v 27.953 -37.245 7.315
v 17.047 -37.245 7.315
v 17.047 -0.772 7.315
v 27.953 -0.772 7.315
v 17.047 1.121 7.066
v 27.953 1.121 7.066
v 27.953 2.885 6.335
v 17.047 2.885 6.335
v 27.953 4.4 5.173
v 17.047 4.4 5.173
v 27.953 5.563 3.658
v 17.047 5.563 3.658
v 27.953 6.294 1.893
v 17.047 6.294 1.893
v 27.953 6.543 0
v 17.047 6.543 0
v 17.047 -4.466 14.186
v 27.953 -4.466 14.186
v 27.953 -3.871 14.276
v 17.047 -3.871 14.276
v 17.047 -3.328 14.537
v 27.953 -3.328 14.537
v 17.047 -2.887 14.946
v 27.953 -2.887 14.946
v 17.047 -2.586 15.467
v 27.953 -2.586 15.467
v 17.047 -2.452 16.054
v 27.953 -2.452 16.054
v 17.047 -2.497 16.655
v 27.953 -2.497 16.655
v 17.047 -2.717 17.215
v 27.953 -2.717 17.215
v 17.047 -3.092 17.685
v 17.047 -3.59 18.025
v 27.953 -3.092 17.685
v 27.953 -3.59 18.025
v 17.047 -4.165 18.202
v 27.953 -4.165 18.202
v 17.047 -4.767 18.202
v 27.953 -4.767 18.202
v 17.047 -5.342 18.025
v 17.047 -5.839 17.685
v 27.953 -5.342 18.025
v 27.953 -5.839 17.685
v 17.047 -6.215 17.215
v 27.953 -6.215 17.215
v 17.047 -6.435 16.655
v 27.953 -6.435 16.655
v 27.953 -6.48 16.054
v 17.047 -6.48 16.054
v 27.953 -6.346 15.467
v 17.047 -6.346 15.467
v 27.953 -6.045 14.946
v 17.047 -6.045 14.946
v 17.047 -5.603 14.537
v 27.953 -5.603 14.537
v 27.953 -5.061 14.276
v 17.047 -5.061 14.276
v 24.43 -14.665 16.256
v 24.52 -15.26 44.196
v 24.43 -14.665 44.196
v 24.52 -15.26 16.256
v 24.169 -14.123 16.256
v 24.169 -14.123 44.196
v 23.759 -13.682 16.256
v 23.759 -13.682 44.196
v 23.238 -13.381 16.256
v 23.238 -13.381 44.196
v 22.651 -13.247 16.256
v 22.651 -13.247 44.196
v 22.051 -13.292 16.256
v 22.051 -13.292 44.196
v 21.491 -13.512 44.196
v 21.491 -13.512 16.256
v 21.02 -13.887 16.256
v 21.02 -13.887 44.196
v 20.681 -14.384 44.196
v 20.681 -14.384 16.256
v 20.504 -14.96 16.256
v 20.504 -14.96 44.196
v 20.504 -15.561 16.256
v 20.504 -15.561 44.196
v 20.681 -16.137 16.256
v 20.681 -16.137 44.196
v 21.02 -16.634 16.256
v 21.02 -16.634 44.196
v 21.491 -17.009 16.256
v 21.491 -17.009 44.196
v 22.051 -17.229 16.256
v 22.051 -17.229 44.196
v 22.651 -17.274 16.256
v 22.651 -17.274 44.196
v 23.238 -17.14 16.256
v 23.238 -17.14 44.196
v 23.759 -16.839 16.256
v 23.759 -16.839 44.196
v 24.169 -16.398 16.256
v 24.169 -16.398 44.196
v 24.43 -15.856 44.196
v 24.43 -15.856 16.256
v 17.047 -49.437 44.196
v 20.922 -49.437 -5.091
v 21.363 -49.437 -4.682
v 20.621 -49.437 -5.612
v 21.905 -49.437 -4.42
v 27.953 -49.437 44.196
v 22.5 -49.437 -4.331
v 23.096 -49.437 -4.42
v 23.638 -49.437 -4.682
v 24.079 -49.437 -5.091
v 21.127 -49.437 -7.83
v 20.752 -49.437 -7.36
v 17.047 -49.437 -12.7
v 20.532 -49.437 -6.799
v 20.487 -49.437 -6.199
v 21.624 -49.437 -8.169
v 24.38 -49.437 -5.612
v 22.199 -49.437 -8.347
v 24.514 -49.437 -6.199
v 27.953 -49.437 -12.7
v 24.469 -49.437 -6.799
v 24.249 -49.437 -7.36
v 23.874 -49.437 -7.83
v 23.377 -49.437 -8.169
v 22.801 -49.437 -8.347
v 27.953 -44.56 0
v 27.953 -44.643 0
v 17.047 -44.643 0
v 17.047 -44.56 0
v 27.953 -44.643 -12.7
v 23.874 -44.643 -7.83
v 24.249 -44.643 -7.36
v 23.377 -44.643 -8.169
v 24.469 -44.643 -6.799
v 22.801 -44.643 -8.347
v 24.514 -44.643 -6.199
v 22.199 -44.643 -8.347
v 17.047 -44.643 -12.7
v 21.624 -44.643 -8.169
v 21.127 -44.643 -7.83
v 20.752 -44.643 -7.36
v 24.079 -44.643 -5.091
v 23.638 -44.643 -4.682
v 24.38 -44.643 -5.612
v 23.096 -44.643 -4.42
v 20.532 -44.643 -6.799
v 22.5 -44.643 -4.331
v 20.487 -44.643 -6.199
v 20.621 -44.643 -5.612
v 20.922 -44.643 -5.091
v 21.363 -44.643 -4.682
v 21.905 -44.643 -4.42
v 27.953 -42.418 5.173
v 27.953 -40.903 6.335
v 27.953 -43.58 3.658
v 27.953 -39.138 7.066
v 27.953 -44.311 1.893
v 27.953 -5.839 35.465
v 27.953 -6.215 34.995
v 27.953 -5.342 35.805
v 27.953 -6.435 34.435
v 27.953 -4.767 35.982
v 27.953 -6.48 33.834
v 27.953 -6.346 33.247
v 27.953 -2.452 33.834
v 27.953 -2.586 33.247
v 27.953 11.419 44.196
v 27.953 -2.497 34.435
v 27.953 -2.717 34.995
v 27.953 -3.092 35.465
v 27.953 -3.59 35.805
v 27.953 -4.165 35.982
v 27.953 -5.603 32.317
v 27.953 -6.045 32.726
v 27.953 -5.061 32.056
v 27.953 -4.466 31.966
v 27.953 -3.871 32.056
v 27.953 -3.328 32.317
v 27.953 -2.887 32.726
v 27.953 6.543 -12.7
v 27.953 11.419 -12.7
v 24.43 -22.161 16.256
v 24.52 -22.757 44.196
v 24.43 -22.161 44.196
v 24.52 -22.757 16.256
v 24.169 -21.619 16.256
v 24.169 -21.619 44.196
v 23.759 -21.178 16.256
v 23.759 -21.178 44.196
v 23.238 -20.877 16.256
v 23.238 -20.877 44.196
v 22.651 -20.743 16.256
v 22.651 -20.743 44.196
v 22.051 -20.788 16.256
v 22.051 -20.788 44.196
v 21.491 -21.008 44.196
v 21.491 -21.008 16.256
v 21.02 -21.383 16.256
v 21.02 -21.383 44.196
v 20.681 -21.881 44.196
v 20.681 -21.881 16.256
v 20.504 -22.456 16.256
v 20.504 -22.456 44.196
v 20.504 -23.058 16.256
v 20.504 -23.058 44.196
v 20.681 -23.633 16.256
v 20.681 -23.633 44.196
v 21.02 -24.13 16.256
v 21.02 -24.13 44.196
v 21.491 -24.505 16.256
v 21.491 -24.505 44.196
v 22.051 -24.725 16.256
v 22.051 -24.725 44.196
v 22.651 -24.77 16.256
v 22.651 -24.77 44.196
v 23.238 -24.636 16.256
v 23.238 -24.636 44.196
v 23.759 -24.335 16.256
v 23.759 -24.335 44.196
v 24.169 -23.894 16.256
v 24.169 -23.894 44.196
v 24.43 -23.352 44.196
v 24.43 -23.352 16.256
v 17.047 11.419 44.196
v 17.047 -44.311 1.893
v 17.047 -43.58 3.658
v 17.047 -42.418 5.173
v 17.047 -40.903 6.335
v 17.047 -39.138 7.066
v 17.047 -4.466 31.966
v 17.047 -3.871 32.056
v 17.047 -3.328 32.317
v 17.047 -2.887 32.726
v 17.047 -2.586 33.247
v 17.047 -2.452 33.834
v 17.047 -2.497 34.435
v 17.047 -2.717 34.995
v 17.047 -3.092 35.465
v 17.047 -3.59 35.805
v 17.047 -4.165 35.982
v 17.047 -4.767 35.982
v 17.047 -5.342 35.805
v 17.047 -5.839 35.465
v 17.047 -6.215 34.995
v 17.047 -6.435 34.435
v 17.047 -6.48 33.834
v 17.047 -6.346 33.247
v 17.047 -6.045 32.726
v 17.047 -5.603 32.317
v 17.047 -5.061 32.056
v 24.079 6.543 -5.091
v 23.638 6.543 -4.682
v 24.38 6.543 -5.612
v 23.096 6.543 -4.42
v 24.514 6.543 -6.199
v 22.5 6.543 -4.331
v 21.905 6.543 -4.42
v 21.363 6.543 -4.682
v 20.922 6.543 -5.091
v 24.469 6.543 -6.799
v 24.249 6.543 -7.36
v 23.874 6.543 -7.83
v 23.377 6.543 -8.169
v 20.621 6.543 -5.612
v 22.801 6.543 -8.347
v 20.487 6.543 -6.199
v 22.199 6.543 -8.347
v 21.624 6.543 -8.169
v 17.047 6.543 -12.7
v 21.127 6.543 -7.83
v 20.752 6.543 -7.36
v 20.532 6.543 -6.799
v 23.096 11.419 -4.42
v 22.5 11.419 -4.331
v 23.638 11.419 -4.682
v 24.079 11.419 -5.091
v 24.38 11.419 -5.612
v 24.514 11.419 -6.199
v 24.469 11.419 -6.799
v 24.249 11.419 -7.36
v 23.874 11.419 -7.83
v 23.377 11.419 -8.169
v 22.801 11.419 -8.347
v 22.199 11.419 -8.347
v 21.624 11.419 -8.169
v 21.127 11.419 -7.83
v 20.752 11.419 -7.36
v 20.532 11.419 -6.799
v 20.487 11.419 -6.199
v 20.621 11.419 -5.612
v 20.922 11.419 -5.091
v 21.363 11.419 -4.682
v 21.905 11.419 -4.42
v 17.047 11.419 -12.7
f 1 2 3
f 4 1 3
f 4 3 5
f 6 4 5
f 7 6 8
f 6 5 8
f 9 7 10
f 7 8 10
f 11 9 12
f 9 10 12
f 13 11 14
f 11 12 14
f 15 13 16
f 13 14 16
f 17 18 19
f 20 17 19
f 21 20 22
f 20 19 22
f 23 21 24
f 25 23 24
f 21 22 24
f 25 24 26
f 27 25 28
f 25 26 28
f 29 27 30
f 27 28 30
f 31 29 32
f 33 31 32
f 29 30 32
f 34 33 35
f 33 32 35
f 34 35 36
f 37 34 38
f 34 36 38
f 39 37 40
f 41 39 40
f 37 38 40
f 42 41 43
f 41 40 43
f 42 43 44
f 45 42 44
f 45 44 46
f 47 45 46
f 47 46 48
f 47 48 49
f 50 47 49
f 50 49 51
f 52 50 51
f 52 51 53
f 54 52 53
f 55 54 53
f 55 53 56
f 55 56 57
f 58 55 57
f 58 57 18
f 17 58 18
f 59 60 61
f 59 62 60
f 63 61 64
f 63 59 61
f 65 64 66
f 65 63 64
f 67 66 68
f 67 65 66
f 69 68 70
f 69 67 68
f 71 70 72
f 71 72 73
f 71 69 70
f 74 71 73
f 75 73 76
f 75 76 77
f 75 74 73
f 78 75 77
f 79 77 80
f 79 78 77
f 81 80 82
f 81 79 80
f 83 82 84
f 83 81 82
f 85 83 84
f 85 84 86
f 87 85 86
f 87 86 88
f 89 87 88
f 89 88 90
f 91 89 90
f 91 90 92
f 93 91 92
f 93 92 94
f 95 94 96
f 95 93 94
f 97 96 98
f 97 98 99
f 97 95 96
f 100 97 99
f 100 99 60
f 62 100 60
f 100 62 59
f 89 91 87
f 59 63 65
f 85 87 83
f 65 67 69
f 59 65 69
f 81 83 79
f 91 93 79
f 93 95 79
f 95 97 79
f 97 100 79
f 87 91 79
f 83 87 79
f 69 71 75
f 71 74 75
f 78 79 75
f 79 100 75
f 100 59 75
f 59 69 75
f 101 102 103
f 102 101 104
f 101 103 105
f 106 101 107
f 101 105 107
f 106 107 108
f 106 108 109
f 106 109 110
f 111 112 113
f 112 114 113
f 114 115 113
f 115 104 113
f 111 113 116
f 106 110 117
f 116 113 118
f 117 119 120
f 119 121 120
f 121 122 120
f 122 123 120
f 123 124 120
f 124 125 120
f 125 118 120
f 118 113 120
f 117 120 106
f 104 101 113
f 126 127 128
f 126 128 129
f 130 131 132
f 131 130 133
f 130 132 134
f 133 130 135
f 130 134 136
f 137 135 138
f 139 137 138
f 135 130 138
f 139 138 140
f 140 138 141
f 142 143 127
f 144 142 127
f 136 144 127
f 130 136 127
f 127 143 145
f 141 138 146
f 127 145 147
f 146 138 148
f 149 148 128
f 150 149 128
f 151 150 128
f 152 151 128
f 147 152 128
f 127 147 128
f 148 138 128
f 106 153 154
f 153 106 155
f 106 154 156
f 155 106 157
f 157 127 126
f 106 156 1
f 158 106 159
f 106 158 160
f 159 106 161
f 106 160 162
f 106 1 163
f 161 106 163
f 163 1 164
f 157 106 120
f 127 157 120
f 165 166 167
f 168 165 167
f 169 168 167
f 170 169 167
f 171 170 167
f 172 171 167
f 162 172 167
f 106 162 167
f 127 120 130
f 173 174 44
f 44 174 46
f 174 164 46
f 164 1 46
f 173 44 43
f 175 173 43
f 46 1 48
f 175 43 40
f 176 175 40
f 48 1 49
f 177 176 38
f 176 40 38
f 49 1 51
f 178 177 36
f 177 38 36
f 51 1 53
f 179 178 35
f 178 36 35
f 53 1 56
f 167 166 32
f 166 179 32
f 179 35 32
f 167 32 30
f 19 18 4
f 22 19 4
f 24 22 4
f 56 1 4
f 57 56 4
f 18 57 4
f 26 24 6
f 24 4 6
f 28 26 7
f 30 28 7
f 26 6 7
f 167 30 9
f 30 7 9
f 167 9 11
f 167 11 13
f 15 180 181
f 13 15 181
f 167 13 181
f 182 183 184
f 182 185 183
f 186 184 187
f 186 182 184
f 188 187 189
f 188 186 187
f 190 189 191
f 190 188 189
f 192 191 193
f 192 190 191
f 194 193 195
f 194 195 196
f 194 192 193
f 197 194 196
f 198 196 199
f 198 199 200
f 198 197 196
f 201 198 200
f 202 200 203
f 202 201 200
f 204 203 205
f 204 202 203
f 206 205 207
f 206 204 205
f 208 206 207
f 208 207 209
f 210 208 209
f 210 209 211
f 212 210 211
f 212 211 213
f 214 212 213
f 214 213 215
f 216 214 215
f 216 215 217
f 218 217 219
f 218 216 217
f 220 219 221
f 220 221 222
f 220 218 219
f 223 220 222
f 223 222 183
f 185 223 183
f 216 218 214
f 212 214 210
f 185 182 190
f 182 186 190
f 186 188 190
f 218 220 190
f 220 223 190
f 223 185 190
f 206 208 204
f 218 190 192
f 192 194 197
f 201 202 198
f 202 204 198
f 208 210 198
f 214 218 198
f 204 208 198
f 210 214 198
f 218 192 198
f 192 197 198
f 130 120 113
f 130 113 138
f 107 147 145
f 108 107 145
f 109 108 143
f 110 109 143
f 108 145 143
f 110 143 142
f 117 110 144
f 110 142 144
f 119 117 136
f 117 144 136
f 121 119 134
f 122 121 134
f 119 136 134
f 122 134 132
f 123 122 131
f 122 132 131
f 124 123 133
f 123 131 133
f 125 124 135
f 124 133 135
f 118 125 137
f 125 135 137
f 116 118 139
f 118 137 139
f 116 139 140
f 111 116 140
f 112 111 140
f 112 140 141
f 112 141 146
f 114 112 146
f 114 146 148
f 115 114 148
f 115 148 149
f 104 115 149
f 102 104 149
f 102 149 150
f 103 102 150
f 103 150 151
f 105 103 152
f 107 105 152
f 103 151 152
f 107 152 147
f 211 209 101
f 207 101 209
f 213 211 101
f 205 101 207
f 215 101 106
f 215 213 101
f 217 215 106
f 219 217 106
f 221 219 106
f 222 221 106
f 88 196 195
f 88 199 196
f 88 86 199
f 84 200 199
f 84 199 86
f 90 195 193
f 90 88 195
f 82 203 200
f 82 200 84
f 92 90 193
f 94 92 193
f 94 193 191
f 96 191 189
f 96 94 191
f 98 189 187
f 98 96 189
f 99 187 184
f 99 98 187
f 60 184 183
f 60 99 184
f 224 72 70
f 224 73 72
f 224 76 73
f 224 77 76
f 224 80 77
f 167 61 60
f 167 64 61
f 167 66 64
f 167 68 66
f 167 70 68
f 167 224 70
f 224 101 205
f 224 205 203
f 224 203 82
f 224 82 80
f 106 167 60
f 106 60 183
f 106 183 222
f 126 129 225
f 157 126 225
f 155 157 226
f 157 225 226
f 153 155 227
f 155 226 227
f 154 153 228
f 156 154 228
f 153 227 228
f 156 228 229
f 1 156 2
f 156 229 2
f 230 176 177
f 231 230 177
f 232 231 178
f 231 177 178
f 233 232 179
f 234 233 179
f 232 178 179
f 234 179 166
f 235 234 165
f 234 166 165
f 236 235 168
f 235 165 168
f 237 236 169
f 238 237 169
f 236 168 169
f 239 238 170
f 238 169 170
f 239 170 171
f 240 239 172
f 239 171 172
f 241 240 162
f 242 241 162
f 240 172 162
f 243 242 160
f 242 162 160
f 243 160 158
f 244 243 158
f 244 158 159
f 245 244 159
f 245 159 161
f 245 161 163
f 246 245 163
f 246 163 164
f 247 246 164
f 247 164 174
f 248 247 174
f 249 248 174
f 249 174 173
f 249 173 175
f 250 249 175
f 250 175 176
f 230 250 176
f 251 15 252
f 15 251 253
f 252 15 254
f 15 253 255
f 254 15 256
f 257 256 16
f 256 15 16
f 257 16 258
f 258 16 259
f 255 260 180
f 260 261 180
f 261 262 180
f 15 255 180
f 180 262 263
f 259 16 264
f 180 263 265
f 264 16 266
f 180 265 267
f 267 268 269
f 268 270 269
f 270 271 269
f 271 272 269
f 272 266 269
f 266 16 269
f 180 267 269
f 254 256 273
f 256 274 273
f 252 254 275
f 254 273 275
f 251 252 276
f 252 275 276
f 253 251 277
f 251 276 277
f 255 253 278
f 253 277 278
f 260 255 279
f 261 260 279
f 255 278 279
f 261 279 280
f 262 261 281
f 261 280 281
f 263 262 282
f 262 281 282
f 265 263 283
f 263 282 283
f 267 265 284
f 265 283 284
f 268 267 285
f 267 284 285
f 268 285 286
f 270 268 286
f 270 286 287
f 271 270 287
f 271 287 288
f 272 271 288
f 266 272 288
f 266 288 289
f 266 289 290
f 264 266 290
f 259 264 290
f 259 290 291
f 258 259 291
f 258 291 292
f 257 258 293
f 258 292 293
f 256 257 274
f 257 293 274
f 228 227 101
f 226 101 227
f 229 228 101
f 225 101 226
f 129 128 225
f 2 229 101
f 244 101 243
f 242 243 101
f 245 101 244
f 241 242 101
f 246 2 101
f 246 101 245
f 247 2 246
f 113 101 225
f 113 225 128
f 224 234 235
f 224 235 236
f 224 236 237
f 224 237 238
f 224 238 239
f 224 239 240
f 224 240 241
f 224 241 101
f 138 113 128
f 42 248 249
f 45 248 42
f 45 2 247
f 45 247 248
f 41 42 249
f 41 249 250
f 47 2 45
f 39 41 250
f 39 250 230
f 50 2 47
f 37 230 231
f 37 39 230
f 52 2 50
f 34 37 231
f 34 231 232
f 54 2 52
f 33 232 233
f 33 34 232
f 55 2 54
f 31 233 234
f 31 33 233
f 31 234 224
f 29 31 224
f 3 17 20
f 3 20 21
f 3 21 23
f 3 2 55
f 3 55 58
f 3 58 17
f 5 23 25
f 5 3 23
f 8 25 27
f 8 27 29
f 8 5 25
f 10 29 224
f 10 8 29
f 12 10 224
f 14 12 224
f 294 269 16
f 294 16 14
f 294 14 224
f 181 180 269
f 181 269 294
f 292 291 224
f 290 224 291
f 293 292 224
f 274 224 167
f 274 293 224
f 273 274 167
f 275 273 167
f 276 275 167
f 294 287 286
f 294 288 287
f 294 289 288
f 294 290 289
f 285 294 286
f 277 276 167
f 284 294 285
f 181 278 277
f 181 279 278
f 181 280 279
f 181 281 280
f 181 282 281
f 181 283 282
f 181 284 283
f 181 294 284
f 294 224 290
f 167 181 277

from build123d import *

# Parameters (mm, degrees)
SKETCH1_W           = 41.656
SKETCH1_H           = 60.855895471
BOSS_EXTRUDE1_DEPTH = 10.905899582
CUT_EXTRUDE1_DEPTH  = 59.321153171
SKETCH5_W           = 2.0193
SKETCH5_H           = 60.855895471
SKETCH6_W           = 2.0193
SKETCH6_H           = 12.7
SKETCH7_W           = 2.0193
SKETCH7_H           = 12.7
SKETCH8_W           = 10.905899582
SKETCH8_H           = 60.855895471
SKETCH8_R           = 2.0193
BOSS_EXTRUDE2_DEPTH = 15.24
SKETCH9_R           = 2.0193
CUT_EXTRUDE2_DEPTH  = 68.202629317


with BuildPart() as part:
    # Sketch1 → Boss-Extrude1 (new body)
    with BuildSketch(Plane(origin=(27.95338, 0, 0), x_dir=(0, 0, -1), z_dir=(1, 0, 0))):
        with Locations((-8.128, -19.008560287)):
            Rectangle(SKETCH1_W, SKETCH1_H)
    extrude(amount=-BOSS_EXTRUDE1_DEPTH)

    # Sketch2 → Cut-Extrude1 (cut, through all)
    with BuildSketch(Plane.ZY.offset(-17.047480418)):
        with BuildLine():
            Line((-12.7, 6.54304), (-12.7, -44.64304))
            Line((-12.7, -44.64304), (0, -44.64304))
            Line((0, -44.64304), (0, -44.560160575))
            ThreePointArc((0, -44.560160575), (5.172627526, -42.4175881), (7.3152, -37.244960575))
            Line((7.3152, -37.244960575), (7.3152, -0.77216))
            ThreePointArc((7.3152, -0.77216), (5.172627526, 4.400467526), (0, 6.54304))
            Line((0, 6.54304), (-12.7, 6.54304))
        make_face()
    extrude(amount=-CUT_EXTRUDE1_DEPTH, mode=Mode.SUBTRACT)

    # Sketch5 → Cut-Revolve3 (revolve, cut)
    with BuildSketch(Plane(origin=(0, 0, -6.35), x_dir=(-1, 0, 0), z_dir=(0, 0, -1)), mode=Mode.PRIVATE) as cut_revolve3_sk:
        with Locations((-23.510080209, -19.008560287)):
            Rectangle(SKETCH5_W, SKETCH5_H)
    revolve(cut_revolve3_sk.sketch.rotate(Axis((22.500430209, -49.436508023, -6.35), (0, 1, 0)), 270), axis=Axis((22.500430209, -49.436508023, -6.35), (0, 1, 0)), mode=Mode.SUBTRACT)

    # Sketch6 → Cut-Revolve4 (revolve, cut)
    with BuildSketch(Plane(origin=(0, -22.756653096, 0), x_dir=(1, 0, 0), z_dir=(0, 1, 0))):
        with Locations((23.510080209, -22.606)):
            Rectangle(SKETCH6_W, SKETCH6_H)
    revolve(axis=Axis((22.500430209, -22.756653096, 16.256), (0, 0, 1)), mode=Mode.SUBTRACT)

    # Sketch7 → Cut-Revolve5 (revolve, cut)
    with BuildSketch(Plane(origin=(0, -15.260467479, 0), x_dir=(1, 0, 0), z_dir=(0, 1, 0))):
        with Locations((23.510080209, -22.606)):
            Rectangle(SKETCH7_W, SKETCH7_H)
    revolve(axis=Axis((22.500430209, -15.260467479, 16.256), (0, 0, 1)), mode=Mode.SUBTRACT)

    # Sketch8 → Boss-Extrude2 (add)
    with BuildSketch(Plane.XY.offset(28.956)):
        with Locations((22.500430209, -19.008560287)):
            Rectangle(SKETCH8_W, SKETCH8_H)
        with Locations((22.500430209, -22.756653096)):
            Circle(SKETCH8_R, mode=Mode.SUBTRACT)
        with Locations((22.500430209, -15.260467479)):
            Circle(SKETCH8_R, mode=Mode.SUBTRACT)
    extrude(amount=BOSS_EXTRUDE2_DEPTH)

    # Sketch9 → Cut-Extrude2 (cut, through all)
    with BuildSketch(Plane(origin=(27.95338, 0, 0), x_dir=(0, 0, -1), z_dir=(1, 0, 0))):
        with Locations((-33.9852, -4.465939121)):
            Circle(SKETCH9_R)
        with Locations((-16.2052, -4.465939121)):
            Circle(SKETCH9_R)
    extrude(amount=-CUT_EXTRUDE2_DEPTH, mode=Mode.SUBTRACT)


solid = part.part
